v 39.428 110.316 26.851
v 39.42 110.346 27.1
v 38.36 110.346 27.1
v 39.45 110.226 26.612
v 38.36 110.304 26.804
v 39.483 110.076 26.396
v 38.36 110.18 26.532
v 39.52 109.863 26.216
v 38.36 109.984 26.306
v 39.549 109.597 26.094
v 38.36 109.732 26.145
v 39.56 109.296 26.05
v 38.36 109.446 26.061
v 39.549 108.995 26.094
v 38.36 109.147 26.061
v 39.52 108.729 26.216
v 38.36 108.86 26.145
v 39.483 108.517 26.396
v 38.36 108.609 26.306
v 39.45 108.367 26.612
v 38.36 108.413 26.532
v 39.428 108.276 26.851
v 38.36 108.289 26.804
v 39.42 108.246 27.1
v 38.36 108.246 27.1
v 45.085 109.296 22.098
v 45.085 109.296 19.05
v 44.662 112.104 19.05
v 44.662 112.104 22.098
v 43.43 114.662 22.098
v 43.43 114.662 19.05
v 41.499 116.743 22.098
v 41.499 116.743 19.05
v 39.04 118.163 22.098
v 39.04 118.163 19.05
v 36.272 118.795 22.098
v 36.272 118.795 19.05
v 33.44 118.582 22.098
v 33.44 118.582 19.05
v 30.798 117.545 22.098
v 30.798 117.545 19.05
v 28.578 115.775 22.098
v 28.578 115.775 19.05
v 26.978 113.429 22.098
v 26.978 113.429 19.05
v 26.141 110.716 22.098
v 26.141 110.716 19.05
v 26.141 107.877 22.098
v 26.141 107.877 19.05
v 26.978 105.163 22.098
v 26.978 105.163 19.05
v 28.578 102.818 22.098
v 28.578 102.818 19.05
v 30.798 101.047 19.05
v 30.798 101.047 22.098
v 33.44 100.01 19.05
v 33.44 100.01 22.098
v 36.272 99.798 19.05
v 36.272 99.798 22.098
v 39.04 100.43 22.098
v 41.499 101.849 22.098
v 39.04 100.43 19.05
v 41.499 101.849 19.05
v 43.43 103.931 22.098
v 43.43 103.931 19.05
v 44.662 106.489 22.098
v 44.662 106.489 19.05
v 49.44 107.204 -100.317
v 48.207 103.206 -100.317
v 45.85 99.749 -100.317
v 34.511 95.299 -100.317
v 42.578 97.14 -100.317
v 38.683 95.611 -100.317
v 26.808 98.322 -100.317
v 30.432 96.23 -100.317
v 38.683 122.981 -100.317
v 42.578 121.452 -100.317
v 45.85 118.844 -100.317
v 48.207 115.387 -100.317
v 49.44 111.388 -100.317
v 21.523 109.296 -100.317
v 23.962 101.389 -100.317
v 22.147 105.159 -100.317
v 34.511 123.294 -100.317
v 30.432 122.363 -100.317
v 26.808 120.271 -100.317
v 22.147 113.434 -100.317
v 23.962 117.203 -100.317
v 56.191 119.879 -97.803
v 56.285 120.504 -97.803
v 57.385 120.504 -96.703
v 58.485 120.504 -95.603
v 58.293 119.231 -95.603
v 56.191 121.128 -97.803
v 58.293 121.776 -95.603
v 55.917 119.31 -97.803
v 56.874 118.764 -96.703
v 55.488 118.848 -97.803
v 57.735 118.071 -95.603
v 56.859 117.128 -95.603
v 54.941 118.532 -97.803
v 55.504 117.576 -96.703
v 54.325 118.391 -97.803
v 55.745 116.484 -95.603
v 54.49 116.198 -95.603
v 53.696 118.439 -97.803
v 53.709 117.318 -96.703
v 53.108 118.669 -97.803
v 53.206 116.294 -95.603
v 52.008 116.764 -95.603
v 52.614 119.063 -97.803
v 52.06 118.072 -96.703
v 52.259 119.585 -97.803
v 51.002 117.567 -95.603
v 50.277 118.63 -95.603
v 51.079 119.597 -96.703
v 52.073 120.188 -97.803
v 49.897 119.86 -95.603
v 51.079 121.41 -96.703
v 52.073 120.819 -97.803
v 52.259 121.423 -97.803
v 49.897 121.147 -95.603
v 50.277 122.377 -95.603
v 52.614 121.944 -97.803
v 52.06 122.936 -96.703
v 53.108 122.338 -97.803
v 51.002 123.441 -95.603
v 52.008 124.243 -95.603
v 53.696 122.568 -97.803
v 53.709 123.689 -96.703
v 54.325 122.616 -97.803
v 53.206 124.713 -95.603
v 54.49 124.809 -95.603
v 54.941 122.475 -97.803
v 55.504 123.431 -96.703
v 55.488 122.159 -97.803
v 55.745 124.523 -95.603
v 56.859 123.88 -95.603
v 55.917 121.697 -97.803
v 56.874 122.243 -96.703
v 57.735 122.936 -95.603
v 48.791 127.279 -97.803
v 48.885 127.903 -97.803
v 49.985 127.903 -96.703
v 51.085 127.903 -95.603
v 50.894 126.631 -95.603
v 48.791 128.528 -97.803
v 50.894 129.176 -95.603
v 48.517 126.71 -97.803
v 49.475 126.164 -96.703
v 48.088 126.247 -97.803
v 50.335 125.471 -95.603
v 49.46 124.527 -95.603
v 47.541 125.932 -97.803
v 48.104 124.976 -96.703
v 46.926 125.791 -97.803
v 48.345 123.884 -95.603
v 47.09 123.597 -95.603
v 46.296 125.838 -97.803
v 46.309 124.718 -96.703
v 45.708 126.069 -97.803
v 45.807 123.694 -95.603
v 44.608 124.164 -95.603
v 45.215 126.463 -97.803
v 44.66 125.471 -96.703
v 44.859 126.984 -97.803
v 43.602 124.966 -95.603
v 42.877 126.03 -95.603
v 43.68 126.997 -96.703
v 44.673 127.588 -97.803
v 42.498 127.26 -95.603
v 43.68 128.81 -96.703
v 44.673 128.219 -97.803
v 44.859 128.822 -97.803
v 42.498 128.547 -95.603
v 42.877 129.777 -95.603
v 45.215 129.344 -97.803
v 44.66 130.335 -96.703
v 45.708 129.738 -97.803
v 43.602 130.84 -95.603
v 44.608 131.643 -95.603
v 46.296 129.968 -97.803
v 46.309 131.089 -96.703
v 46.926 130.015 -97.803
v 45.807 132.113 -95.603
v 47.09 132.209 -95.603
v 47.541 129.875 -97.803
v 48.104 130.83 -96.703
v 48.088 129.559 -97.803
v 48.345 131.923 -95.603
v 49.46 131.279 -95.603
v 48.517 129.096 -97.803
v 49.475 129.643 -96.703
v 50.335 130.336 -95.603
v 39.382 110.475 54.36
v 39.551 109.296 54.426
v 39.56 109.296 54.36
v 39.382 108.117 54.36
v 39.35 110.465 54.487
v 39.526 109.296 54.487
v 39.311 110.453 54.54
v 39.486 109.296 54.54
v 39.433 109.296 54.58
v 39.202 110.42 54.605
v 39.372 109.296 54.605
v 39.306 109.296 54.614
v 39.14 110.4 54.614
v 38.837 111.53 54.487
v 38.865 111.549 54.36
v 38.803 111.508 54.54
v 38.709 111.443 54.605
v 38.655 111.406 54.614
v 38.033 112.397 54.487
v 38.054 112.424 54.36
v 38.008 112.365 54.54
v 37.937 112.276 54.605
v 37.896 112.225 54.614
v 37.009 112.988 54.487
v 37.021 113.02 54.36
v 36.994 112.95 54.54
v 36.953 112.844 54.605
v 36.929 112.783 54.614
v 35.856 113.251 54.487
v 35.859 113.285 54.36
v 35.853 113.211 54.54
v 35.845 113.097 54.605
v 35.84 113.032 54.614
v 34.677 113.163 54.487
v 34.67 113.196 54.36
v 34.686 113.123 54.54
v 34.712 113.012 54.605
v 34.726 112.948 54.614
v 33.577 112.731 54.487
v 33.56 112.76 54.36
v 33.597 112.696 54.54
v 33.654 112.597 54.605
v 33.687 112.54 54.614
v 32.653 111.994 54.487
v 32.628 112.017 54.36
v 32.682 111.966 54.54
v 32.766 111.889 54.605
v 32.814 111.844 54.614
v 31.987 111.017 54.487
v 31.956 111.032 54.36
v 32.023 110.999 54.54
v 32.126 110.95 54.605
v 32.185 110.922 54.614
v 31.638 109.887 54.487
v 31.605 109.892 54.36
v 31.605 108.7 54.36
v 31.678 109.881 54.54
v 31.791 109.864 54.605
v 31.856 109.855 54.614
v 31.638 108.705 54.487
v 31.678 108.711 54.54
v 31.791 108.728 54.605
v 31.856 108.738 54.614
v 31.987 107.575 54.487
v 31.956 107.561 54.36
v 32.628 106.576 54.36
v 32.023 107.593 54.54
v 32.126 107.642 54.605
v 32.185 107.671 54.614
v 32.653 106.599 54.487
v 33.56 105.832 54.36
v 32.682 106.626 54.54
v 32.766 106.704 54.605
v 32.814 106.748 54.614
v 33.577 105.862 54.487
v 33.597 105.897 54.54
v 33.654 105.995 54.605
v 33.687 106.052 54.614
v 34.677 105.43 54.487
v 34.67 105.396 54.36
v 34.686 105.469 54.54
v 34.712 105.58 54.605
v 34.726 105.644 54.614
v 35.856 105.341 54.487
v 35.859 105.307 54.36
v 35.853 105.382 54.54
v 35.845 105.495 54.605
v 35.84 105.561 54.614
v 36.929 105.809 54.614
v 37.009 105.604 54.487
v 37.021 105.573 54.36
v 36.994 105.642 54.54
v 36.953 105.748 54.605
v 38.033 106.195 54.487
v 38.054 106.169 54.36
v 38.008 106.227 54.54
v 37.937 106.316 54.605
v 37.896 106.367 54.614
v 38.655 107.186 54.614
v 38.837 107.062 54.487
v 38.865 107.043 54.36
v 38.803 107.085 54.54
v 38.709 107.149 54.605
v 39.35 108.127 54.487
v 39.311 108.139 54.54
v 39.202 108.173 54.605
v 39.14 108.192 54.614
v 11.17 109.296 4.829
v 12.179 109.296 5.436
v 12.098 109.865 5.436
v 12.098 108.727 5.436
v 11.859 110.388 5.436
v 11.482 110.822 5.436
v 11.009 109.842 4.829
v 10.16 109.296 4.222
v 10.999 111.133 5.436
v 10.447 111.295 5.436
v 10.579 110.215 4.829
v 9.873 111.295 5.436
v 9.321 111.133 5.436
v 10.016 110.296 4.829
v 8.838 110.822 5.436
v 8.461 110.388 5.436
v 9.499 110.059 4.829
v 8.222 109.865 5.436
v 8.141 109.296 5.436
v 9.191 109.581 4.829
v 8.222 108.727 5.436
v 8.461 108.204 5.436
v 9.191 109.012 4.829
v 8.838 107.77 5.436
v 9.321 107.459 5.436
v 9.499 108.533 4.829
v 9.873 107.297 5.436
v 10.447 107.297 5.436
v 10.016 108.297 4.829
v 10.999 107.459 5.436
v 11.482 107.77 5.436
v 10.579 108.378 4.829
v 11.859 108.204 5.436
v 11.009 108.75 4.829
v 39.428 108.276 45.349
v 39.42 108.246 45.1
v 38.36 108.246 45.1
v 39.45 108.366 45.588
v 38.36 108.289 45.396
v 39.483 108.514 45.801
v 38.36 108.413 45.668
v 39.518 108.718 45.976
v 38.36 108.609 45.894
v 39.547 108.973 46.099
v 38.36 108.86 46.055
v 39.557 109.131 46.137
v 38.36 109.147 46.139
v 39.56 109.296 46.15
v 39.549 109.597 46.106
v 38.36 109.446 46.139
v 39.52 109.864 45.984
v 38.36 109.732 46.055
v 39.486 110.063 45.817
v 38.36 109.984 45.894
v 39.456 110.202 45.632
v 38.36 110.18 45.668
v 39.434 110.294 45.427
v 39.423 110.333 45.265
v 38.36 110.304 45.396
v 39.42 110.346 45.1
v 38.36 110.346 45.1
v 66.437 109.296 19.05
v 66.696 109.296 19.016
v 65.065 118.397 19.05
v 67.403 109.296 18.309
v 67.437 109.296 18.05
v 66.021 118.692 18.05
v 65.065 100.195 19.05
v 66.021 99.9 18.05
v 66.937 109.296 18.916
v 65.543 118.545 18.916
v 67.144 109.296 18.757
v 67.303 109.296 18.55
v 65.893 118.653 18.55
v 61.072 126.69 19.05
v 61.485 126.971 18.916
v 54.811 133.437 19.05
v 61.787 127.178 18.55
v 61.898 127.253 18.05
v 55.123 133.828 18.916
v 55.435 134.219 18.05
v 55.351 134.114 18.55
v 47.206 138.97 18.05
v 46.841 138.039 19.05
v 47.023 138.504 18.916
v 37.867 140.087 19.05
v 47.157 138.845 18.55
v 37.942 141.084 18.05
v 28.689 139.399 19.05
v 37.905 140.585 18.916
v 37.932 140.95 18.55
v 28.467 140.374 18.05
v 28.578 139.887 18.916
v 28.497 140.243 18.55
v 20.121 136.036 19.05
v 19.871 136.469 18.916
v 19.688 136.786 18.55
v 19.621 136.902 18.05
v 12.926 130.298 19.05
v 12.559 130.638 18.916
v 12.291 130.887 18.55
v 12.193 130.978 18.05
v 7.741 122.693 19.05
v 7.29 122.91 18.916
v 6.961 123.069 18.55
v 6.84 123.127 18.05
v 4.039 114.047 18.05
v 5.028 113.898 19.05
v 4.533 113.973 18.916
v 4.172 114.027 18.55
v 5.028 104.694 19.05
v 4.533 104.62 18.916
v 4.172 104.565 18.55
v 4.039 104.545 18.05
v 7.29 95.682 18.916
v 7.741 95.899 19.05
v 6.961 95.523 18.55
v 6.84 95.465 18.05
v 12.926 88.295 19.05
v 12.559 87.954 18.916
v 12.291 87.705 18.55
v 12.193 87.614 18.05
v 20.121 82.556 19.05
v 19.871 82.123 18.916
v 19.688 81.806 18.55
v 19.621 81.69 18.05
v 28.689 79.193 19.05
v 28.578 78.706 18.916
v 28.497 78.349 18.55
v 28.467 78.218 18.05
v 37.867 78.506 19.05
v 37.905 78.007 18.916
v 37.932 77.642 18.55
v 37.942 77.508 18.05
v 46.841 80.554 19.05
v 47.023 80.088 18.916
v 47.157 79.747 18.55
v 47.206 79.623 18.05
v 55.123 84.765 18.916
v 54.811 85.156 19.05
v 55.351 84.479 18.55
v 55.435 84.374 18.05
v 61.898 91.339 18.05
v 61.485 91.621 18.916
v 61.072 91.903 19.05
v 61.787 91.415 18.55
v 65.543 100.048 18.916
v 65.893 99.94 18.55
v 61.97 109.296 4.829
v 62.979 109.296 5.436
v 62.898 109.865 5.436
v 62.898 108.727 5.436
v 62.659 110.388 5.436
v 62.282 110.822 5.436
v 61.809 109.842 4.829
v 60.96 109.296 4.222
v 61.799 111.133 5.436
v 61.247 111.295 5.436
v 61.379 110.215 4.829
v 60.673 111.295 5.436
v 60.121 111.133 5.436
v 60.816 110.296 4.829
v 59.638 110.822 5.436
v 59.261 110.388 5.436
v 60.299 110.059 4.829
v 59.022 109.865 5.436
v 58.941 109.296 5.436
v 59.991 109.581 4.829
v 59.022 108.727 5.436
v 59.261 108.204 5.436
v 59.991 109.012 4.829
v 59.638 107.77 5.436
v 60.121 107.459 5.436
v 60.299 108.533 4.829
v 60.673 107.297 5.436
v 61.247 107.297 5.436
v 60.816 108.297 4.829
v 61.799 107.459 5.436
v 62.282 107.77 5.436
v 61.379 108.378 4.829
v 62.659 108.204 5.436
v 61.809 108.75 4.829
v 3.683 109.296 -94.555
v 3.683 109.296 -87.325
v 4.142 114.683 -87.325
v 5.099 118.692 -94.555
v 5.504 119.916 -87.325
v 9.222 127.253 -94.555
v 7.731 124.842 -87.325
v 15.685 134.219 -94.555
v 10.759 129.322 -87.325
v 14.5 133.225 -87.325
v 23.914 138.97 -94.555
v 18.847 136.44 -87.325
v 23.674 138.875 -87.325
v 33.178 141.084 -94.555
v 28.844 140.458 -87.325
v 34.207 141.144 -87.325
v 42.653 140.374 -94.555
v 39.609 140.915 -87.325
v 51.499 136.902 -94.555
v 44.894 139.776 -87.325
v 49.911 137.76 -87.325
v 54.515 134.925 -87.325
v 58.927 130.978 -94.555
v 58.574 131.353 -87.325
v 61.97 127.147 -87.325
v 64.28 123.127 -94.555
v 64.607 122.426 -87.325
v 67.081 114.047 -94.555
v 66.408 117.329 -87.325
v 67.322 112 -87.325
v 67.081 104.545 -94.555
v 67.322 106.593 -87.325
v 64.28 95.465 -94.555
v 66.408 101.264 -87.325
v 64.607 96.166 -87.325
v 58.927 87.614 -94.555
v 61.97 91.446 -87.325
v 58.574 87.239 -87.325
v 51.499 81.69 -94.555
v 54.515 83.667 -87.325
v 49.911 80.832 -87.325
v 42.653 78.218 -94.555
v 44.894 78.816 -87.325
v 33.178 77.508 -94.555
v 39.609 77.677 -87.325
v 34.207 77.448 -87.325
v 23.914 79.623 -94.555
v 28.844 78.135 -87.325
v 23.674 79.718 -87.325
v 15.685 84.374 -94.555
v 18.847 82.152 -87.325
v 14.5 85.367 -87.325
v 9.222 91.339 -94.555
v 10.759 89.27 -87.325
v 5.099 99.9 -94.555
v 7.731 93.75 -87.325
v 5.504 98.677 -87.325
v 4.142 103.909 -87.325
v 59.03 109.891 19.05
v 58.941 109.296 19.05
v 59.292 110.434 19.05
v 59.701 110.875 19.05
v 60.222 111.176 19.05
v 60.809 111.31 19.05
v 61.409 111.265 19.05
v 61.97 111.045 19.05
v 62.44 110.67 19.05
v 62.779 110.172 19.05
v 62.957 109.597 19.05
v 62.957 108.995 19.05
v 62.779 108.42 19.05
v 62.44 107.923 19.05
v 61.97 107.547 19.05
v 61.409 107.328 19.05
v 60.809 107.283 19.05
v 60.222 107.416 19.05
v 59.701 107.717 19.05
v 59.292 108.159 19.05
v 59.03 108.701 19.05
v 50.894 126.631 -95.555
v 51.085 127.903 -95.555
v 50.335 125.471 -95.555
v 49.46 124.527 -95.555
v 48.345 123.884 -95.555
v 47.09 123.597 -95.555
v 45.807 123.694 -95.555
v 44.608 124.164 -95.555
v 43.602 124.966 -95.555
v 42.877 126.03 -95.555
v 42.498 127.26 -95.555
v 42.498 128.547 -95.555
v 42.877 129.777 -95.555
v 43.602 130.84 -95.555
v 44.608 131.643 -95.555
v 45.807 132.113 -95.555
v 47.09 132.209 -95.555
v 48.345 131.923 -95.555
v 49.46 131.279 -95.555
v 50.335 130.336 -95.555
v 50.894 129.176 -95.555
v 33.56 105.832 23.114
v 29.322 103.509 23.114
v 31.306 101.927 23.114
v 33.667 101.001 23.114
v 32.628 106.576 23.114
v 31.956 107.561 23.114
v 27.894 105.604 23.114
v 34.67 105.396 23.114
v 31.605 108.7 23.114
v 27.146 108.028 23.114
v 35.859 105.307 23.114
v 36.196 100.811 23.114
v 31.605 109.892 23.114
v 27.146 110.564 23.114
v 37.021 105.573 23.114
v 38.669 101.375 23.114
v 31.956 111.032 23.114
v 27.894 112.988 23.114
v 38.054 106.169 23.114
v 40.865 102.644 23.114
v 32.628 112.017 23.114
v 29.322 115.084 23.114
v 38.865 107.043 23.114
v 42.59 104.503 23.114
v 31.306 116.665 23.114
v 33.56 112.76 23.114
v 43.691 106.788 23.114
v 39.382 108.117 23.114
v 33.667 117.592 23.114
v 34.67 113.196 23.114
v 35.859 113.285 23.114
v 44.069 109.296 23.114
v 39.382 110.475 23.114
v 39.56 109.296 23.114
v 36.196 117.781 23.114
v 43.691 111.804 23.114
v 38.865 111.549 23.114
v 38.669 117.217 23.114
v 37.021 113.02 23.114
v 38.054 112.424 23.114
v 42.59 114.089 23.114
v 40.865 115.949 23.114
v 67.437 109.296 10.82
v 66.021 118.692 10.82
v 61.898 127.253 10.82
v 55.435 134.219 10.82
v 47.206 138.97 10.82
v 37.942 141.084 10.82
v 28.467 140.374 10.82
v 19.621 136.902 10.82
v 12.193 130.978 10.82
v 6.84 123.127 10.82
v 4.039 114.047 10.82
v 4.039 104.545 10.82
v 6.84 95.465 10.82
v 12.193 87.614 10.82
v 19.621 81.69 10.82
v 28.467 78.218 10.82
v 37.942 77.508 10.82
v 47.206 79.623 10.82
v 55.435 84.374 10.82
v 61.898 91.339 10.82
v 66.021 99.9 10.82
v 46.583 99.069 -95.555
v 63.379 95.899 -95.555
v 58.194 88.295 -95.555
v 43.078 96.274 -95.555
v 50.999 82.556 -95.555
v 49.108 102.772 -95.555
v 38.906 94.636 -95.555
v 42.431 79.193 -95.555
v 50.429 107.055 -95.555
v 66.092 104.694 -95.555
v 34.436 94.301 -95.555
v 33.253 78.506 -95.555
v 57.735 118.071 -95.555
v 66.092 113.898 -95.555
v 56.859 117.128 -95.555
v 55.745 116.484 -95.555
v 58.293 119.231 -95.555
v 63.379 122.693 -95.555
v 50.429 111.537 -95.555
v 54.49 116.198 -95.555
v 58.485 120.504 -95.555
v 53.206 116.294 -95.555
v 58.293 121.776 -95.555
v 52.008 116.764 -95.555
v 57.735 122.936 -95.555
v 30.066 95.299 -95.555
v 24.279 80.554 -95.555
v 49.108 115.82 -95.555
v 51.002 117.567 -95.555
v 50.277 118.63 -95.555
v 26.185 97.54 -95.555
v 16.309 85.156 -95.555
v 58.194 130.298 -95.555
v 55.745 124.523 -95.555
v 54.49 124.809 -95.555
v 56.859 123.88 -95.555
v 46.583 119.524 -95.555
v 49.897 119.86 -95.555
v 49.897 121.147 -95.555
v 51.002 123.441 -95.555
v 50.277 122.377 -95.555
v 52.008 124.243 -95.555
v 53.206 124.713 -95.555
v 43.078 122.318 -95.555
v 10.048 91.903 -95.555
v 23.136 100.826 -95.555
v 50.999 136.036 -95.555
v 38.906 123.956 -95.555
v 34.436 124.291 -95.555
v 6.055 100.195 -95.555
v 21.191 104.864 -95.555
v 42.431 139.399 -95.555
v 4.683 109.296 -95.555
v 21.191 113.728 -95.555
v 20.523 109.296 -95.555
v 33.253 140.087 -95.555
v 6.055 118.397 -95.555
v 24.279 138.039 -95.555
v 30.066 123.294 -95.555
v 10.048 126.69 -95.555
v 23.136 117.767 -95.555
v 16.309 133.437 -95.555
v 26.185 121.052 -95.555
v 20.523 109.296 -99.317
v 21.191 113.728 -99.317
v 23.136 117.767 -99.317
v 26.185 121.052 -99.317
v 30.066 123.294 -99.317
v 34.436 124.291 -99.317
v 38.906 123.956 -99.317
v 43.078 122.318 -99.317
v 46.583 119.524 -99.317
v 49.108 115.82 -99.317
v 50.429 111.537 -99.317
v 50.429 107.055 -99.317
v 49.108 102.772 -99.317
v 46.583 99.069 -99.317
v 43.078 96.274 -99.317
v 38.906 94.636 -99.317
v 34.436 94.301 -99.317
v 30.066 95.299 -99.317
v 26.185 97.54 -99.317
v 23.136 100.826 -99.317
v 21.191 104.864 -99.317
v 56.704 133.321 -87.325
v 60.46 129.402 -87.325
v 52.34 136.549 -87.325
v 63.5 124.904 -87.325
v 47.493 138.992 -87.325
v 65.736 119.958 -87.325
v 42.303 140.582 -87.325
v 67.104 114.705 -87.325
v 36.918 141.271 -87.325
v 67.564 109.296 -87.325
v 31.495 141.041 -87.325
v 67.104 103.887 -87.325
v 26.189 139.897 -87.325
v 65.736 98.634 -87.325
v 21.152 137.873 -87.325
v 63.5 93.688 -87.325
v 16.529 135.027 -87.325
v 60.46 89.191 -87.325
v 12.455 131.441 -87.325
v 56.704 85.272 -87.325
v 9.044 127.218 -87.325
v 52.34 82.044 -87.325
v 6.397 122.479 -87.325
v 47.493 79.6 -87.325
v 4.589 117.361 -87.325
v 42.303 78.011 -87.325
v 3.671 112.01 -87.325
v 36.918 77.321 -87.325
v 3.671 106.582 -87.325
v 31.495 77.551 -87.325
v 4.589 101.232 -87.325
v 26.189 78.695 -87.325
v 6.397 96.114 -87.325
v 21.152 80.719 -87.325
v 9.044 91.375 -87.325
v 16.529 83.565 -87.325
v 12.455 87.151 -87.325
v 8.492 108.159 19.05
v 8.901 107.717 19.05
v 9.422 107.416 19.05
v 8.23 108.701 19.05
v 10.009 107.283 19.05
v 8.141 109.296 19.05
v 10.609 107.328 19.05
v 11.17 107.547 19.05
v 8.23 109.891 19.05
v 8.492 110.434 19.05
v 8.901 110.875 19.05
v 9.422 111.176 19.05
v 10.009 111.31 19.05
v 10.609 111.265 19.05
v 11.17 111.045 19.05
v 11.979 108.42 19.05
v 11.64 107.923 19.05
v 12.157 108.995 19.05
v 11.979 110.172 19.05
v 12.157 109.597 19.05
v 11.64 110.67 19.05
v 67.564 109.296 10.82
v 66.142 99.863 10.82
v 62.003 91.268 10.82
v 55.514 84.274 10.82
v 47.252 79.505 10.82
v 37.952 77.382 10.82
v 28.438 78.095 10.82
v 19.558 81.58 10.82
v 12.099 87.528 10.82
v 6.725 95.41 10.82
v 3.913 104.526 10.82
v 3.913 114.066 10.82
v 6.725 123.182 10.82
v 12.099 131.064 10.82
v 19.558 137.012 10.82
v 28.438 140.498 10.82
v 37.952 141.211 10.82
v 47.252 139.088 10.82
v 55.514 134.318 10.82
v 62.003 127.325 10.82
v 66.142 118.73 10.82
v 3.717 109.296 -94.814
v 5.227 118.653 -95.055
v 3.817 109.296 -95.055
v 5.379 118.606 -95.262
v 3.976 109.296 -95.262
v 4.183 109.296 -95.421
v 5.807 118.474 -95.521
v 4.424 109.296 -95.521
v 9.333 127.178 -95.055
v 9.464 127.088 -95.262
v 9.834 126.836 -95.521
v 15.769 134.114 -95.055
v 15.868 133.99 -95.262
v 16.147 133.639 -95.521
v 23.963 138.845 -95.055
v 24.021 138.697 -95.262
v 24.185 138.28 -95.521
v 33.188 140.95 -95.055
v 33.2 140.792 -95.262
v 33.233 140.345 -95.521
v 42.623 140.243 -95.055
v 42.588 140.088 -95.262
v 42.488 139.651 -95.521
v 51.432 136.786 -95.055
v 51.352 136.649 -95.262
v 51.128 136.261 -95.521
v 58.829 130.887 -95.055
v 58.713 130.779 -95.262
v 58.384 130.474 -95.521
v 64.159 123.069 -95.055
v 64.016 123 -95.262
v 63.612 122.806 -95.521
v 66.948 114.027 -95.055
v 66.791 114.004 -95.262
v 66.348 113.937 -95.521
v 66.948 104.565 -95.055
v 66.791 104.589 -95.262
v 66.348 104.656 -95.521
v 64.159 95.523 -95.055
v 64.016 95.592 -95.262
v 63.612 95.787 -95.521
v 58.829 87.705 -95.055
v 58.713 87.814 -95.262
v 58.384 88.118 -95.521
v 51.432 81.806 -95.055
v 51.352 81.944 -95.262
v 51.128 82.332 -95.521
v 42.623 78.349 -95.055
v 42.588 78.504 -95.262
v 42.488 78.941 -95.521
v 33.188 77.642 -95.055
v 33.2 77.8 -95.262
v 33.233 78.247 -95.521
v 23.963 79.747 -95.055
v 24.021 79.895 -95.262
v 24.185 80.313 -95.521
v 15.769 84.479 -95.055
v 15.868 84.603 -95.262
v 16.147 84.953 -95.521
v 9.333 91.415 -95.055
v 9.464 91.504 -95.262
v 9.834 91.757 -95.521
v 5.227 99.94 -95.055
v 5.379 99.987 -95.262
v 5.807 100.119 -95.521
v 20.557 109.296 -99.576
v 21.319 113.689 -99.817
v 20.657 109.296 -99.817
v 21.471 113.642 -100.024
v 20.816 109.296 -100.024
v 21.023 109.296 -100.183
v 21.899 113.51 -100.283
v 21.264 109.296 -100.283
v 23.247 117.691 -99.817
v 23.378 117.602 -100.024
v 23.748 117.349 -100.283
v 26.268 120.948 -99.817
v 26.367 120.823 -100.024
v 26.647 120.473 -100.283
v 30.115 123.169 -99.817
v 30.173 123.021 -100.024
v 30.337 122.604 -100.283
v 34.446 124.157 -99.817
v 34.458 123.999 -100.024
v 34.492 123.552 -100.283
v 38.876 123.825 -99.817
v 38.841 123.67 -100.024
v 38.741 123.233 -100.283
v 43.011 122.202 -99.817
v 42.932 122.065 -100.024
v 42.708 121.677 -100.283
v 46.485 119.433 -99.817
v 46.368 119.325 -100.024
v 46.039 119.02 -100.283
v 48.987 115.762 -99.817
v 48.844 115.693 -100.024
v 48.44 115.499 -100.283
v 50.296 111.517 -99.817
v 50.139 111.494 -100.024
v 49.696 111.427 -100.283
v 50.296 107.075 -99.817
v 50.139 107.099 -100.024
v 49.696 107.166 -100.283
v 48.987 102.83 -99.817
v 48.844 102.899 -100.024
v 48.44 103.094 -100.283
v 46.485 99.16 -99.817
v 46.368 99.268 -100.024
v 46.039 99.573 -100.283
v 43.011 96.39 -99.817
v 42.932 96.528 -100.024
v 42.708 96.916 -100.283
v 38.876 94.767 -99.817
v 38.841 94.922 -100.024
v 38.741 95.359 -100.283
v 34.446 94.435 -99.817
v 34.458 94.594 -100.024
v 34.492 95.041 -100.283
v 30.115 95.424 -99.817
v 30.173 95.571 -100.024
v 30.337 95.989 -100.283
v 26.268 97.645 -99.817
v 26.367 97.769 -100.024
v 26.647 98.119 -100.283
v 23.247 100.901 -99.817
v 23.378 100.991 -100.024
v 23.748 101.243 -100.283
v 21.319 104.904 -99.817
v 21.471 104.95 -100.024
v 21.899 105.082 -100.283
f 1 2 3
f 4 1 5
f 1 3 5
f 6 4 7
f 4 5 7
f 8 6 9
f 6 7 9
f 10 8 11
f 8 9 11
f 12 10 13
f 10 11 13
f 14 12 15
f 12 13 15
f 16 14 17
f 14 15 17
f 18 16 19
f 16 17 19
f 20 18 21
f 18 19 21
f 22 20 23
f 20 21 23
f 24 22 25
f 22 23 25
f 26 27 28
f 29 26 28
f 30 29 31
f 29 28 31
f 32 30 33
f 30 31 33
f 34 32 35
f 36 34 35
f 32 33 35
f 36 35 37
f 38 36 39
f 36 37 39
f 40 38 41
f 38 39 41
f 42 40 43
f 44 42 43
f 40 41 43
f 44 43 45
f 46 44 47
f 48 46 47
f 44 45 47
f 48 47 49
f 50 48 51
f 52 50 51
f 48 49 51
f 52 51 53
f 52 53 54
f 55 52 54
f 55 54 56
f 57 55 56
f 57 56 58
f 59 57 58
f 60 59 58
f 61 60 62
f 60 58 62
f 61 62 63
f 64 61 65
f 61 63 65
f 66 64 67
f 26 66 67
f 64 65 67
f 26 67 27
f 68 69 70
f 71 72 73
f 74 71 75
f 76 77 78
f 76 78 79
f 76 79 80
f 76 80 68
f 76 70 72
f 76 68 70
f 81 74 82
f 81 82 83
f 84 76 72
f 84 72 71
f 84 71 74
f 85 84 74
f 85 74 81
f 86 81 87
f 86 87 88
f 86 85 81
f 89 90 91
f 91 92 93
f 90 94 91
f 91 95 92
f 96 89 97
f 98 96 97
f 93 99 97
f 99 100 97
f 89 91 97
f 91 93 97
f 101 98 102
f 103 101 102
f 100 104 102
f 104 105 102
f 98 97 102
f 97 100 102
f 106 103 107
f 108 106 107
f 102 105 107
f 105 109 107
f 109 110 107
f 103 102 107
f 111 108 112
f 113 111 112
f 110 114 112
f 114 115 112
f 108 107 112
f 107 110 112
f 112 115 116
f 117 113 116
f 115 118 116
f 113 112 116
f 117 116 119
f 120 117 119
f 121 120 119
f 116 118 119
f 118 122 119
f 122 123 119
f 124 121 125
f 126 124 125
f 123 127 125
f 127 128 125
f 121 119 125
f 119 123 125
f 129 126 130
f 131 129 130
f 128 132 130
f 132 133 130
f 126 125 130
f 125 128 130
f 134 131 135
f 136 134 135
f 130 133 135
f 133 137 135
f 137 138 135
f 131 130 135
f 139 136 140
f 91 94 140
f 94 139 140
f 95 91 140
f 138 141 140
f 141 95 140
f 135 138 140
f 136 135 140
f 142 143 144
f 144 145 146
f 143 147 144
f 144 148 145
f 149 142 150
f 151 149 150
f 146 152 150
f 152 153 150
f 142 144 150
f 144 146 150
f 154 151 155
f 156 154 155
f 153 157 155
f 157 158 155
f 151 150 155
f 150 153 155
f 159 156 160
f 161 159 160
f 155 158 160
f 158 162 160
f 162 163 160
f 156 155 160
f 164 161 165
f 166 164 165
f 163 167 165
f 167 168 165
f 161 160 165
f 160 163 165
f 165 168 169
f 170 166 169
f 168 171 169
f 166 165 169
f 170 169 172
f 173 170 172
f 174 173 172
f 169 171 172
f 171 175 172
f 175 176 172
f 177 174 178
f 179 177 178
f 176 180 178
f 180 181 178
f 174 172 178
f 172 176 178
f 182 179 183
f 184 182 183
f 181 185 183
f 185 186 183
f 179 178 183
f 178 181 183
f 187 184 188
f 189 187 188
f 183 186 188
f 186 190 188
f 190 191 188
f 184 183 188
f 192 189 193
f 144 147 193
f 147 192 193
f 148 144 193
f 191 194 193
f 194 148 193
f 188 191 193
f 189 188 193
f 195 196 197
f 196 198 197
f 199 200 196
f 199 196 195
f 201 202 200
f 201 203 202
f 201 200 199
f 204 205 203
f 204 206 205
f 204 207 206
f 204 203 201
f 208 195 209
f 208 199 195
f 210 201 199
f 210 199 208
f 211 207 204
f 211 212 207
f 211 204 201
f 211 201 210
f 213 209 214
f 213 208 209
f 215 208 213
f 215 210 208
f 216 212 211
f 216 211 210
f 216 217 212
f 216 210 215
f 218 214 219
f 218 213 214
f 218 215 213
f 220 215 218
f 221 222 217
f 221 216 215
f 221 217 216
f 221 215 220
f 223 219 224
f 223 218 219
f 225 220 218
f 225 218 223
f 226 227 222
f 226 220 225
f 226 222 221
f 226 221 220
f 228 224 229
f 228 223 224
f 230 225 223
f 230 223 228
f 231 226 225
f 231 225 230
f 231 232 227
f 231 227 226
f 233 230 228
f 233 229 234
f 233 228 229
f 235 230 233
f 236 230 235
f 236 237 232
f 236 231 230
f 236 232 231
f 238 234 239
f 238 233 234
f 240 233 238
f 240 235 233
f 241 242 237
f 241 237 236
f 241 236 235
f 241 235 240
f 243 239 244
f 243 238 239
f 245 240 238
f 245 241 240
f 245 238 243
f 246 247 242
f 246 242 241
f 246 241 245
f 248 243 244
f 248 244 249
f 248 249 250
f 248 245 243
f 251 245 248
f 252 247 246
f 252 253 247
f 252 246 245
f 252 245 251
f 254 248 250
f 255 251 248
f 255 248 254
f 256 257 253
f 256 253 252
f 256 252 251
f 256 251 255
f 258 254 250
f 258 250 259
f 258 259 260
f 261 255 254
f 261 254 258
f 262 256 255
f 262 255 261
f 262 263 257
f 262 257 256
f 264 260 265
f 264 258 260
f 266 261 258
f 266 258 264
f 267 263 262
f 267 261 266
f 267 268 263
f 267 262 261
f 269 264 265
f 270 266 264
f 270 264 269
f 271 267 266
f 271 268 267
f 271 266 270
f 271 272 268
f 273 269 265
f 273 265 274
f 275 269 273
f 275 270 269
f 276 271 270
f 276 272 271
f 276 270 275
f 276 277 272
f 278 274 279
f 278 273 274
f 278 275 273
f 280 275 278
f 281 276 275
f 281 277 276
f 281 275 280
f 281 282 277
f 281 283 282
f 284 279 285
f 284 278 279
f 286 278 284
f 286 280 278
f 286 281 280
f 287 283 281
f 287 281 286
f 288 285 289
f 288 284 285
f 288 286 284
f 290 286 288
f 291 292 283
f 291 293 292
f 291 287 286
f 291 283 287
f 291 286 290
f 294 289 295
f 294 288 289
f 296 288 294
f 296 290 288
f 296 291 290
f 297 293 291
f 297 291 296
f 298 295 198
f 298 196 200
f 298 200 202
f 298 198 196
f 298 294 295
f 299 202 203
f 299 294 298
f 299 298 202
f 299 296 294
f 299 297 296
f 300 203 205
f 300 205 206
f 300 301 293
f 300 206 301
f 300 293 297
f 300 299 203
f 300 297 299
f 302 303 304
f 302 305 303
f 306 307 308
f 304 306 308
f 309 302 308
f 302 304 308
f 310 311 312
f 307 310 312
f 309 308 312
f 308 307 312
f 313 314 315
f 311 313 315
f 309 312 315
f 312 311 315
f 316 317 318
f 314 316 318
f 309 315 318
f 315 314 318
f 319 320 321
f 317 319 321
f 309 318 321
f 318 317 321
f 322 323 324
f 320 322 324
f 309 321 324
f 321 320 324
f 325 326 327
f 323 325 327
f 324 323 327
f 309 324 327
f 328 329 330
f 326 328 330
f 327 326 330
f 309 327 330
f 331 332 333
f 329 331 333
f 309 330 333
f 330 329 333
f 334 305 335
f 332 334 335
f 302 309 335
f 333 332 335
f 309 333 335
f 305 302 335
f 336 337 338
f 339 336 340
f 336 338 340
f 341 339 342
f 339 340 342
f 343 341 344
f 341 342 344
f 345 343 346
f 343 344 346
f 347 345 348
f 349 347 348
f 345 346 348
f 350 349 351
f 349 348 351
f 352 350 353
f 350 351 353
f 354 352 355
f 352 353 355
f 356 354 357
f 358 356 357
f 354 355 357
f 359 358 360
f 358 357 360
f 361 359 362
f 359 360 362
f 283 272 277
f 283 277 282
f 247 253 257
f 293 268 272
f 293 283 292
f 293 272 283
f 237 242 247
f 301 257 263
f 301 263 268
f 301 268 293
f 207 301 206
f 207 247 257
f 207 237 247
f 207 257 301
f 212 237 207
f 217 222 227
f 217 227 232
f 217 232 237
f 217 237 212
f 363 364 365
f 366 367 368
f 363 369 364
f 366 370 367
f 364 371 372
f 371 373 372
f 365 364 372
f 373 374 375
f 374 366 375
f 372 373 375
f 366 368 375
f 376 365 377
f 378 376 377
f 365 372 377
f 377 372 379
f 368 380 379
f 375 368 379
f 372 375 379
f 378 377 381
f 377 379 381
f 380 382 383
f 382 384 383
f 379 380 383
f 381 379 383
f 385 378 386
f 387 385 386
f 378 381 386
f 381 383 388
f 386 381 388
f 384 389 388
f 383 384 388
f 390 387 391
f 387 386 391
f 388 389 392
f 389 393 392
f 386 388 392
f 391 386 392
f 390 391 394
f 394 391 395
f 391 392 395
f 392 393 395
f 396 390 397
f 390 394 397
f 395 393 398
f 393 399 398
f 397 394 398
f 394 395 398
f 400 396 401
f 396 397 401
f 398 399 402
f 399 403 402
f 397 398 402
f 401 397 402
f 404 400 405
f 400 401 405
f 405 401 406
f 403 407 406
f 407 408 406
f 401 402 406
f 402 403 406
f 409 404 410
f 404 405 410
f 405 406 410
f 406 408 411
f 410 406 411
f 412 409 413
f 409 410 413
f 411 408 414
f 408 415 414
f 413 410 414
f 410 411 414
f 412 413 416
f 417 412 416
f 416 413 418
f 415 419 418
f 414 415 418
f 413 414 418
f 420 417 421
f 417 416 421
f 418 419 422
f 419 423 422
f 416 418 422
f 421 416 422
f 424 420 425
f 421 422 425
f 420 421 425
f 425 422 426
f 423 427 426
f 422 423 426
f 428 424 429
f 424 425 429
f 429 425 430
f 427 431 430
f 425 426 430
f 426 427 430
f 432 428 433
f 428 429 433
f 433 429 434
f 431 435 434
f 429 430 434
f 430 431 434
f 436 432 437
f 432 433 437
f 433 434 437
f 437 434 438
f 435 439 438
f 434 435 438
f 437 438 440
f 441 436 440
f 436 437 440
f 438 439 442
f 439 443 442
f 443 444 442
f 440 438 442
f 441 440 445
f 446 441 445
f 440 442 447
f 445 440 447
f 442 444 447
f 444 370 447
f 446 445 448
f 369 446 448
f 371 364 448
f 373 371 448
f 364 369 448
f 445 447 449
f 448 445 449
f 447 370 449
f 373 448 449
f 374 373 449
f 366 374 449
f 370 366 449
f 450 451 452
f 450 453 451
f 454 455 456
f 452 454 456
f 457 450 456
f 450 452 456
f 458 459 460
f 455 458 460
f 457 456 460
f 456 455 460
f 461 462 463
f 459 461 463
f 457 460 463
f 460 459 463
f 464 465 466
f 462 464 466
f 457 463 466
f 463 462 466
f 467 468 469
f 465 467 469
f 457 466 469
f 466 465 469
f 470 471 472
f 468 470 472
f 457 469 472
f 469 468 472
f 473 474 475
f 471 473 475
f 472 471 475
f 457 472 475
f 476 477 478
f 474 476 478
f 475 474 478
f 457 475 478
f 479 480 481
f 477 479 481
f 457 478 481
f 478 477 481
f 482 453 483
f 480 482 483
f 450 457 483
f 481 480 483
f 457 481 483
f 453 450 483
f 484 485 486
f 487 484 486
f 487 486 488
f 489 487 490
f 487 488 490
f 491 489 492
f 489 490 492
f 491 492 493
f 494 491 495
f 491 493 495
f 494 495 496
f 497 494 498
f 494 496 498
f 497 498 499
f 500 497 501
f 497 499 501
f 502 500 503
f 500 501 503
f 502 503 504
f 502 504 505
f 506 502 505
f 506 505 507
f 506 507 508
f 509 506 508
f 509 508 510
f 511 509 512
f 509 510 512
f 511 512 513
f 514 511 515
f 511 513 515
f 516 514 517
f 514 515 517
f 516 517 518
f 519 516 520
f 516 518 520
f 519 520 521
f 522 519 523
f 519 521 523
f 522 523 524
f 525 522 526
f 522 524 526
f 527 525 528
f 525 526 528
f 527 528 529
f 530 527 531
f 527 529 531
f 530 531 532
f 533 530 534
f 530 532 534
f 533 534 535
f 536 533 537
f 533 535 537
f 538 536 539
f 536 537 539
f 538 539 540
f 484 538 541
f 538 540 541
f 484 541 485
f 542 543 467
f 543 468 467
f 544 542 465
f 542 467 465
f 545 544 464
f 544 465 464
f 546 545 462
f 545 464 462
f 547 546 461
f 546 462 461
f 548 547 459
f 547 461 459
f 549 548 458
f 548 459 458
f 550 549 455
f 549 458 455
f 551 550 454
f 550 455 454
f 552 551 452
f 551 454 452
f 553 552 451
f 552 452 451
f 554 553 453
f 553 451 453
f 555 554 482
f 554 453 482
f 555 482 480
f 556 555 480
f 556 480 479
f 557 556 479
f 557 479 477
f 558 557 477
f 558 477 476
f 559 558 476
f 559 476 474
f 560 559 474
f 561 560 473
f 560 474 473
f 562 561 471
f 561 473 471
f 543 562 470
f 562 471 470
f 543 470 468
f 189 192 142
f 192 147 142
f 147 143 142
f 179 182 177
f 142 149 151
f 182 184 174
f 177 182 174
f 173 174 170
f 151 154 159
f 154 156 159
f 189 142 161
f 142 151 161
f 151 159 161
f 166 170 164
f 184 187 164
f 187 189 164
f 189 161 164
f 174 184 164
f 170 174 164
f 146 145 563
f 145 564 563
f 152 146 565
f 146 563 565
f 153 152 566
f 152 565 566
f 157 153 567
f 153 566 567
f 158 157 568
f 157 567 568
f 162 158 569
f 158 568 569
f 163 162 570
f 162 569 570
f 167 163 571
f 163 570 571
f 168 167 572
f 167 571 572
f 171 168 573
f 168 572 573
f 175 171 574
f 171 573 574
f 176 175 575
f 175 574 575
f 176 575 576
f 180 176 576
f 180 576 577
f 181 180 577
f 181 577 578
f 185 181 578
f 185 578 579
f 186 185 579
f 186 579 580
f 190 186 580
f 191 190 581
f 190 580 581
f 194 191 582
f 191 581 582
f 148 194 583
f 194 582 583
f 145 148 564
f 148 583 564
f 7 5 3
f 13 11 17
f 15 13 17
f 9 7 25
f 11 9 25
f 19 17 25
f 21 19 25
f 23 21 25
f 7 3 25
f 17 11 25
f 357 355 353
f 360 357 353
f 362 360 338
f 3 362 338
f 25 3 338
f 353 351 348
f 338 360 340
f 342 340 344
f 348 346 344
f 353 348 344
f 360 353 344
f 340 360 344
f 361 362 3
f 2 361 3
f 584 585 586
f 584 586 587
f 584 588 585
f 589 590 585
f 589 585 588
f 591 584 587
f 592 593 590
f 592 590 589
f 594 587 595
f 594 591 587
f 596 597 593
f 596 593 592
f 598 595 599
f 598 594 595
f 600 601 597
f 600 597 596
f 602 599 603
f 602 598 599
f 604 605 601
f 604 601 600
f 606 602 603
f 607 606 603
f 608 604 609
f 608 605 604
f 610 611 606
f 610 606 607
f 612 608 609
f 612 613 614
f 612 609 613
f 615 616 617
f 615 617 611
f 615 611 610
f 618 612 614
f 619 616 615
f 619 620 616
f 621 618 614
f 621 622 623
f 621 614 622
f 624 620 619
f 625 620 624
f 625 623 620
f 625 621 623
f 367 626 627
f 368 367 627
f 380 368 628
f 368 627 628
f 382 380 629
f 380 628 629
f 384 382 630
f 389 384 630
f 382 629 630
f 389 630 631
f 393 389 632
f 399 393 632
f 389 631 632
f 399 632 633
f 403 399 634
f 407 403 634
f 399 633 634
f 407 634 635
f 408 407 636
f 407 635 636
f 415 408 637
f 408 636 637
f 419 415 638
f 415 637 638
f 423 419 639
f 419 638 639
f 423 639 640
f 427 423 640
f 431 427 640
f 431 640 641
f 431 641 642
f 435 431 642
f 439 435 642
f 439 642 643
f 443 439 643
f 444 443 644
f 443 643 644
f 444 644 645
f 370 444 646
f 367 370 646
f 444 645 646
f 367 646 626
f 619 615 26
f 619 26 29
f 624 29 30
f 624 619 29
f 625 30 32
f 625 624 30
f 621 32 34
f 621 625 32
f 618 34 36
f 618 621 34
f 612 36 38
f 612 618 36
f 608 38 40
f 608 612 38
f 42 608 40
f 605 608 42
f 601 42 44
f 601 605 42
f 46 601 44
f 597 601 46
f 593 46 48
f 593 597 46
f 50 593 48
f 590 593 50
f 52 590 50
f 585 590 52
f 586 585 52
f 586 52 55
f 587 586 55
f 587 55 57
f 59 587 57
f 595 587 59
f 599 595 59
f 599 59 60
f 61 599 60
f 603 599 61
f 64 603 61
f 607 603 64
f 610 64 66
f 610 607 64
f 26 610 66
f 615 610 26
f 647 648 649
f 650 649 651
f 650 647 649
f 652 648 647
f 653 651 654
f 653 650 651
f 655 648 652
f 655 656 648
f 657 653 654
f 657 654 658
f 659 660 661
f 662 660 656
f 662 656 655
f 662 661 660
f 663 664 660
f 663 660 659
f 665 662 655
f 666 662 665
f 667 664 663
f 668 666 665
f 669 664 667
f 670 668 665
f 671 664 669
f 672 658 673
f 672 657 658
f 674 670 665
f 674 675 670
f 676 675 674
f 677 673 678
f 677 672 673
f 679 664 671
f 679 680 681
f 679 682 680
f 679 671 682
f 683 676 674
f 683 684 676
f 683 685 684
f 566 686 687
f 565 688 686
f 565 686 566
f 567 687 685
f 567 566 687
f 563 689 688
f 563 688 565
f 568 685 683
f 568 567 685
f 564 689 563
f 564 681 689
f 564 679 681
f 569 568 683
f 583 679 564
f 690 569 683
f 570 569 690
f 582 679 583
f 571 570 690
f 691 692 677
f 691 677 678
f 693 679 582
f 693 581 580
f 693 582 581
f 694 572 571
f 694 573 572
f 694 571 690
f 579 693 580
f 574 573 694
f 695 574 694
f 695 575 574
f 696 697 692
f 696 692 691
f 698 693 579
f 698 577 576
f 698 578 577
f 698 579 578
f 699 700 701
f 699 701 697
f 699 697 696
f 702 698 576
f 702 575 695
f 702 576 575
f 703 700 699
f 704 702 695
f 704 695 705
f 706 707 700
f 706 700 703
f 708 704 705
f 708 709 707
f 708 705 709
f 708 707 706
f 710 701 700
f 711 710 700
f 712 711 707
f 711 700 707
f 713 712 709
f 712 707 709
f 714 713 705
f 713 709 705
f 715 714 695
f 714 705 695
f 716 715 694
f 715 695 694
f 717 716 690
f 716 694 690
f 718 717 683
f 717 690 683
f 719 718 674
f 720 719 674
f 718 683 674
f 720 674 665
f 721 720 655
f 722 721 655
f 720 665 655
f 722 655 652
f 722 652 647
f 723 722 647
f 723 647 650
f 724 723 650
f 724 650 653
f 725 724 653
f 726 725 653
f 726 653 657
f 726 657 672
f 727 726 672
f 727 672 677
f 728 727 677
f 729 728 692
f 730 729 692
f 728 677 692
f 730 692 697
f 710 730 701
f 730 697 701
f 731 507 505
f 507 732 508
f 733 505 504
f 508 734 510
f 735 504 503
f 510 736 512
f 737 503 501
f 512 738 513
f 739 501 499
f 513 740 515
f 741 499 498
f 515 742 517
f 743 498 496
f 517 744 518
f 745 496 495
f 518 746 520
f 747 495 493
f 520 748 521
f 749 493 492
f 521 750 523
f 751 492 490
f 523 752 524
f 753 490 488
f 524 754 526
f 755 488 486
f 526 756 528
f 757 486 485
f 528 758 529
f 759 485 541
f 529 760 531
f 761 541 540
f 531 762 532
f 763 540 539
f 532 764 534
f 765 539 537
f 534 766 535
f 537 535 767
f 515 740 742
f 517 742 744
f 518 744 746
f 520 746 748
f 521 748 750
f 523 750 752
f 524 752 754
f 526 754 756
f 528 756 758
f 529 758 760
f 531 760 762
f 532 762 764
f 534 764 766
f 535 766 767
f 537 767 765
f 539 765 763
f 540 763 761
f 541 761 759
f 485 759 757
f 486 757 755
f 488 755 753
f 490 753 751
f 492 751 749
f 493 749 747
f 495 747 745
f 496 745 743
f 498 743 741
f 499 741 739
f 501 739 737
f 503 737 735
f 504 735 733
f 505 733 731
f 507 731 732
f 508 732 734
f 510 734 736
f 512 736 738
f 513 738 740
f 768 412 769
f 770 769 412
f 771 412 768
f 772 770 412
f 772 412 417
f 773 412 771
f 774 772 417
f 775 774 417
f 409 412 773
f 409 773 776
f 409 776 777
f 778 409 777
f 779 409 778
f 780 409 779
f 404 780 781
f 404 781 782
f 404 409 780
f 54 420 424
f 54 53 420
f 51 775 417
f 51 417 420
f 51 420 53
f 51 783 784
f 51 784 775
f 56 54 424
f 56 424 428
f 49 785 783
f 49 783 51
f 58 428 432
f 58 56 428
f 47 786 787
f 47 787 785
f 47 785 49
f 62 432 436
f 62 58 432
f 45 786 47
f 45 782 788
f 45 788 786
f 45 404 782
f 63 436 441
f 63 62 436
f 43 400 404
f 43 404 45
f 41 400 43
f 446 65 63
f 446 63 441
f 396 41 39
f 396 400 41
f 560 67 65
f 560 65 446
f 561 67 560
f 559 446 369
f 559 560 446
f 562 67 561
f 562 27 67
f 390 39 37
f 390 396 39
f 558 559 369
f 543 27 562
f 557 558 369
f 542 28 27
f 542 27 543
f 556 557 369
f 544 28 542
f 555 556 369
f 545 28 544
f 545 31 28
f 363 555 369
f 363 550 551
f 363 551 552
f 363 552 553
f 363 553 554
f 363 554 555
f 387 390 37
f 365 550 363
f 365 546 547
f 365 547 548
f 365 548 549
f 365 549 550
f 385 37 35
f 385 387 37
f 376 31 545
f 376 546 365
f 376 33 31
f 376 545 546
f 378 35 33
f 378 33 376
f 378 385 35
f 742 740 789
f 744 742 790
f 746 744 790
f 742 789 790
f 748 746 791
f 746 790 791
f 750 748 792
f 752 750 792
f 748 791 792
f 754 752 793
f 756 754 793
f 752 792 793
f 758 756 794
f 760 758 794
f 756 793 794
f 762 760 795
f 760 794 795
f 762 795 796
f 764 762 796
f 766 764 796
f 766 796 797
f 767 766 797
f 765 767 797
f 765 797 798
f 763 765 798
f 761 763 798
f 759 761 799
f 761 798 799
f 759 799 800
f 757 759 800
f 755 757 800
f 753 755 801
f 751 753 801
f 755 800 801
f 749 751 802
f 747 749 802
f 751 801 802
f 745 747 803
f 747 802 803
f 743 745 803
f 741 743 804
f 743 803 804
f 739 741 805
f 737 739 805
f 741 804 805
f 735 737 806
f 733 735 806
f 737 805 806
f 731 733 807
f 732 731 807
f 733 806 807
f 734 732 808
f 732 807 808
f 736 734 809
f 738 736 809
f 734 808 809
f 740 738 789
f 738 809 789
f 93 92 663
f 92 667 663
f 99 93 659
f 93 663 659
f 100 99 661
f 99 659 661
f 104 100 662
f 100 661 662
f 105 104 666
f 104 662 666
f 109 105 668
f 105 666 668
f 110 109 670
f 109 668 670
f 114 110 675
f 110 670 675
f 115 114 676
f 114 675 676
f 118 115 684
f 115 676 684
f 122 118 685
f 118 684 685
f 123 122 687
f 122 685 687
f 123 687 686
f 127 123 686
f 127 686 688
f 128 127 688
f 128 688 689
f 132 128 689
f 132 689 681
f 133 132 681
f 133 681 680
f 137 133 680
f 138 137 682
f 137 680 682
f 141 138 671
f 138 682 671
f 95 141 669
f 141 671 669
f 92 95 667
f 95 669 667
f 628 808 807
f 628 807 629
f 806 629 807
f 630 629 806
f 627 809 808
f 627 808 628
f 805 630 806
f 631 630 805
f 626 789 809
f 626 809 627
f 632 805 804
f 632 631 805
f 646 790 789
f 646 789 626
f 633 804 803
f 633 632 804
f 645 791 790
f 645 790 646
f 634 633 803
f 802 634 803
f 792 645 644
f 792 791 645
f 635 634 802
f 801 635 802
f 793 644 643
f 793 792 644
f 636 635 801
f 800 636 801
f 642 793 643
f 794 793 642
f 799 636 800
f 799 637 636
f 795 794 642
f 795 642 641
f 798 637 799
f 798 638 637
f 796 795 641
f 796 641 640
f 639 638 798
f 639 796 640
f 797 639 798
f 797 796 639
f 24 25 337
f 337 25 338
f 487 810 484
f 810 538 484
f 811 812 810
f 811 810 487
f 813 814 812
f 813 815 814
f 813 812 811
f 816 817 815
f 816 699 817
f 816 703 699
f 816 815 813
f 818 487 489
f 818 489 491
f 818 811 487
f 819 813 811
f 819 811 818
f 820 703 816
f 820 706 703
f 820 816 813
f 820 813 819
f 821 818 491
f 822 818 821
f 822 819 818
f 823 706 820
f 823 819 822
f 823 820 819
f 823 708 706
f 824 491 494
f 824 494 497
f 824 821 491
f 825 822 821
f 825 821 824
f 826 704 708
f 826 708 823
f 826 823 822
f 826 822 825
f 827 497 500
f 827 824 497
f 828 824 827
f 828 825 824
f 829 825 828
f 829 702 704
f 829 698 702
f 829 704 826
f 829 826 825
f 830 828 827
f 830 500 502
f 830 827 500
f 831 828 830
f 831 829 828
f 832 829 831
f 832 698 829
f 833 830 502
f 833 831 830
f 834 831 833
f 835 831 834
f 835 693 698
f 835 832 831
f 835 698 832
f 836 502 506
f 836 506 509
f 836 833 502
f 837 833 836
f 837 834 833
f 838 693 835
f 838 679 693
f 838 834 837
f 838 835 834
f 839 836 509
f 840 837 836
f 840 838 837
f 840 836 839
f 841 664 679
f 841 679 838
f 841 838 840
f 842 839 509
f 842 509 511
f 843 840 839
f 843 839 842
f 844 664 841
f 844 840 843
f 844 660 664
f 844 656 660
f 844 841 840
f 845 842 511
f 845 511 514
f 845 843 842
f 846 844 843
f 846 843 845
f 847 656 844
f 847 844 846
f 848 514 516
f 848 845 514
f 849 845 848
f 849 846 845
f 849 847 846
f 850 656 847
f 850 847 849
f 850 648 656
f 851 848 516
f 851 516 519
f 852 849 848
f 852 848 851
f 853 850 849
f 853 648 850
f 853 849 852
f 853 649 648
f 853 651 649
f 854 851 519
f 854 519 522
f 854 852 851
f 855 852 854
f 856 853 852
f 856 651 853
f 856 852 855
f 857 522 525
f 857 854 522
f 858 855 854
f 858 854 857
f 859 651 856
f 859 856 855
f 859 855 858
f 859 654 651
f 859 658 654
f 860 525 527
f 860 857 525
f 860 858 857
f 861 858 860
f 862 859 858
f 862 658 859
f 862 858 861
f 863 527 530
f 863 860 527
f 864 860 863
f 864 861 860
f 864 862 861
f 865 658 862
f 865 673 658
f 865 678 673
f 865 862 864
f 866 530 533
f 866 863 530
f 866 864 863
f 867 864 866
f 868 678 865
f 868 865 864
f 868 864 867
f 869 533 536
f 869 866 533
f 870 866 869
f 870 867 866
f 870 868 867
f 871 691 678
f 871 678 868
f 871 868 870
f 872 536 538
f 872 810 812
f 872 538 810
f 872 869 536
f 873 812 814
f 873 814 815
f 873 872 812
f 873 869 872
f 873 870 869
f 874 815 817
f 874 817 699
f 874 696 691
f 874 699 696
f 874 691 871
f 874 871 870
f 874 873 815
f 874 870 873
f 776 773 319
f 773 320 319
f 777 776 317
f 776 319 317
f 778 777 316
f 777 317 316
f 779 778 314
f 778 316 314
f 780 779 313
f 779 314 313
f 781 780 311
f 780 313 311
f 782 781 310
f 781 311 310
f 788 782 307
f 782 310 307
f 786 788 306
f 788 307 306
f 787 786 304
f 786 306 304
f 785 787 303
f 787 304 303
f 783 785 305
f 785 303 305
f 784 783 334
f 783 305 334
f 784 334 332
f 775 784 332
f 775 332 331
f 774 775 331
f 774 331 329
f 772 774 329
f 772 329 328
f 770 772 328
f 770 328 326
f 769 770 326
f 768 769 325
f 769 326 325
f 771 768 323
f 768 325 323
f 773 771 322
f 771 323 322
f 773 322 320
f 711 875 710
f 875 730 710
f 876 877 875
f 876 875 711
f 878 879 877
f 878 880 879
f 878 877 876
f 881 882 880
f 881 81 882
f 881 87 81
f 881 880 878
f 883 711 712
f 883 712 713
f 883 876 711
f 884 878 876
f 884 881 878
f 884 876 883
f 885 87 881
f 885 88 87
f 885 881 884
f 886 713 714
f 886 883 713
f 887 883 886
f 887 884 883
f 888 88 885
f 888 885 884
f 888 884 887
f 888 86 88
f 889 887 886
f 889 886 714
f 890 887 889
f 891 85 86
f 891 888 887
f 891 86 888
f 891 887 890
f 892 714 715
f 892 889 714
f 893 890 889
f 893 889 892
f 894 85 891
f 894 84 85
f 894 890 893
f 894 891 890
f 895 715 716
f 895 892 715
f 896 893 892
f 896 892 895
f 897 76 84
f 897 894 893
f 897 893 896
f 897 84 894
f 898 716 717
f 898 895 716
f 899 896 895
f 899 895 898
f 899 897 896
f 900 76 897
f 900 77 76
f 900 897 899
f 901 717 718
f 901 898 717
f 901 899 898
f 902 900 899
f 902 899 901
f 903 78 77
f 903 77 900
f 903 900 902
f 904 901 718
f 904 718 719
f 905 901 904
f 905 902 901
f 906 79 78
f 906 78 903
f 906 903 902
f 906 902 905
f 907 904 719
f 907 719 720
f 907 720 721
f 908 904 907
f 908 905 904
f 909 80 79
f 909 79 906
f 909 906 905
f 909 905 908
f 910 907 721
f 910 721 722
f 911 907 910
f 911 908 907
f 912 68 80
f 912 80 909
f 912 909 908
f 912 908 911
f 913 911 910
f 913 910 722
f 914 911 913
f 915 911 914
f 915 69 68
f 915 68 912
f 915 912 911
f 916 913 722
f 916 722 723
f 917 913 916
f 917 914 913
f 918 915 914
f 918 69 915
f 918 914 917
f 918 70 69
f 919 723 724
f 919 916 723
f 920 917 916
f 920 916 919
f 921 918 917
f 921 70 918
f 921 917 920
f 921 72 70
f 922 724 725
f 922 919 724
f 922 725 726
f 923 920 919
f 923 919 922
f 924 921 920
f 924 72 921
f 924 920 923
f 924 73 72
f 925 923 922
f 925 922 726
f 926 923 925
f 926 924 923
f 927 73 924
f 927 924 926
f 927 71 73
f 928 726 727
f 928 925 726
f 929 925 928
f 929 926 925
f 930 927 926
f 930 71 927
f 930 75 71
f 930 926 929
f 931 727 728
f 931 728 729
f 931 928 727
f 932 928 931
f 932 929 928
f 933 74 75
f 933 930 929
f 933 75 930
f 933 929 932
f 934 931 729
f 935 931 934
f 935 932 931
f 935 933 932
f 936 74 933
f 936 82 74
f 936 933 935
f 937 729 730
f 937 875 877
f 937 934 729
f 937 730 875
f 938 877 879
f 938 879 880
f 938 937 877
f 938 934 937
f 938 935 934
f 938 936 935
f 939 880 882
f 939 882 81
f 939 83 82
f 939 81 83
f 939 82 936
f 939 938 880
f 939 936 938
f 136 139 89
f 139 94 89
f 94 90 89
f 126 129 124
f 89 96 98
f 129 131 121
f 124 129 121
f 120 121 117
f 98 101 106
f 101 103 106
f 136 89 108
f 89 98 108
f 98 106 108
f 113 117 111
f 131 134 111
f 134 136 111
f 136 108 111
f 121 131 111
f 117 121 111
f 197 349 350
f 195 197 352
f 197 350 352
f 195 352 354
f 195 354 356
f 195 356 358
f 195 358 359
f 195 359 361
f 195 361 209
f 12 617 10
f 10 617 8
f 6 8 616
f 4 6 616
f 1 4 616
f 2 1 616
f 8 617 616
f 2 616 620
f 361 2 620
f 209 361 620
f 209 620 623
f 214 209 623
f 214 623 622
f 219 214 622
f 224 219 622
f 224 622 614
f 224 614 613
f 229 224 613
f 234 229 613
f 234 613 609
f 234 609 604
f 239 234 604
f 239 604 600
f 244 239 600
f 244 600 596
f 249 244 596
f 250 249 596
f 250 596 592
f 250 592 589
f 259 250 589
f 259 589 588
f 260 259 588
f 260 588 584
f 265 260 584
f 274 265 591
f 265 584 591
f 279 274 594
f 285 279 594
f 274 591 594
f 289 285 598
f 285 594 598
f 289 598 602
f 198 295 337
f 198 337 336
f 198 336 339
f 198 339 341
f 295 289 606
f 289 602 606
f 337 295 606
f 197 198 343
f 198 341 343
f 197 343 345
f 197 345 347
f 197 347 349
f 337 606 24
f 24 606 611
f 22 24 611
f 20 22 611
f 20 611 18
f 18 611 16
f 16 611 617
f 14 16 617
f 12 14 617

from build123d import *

# Parameters (mm, degrees)
SKETCH1_W                       = 32.004
SKETCH1_H                       = 98.1456
SKETCH2_R                       = 31.877
BOSS_EXTRUDE1_DEPTH             = 8.2296
SKETCH3_R                       = 15.0368
BOSS_EXTRUDE2_DEPTH             = 4.7625
SKETCH4_R                       = 31.877
BOSS_EXTRUDE3_DEPTH             = 8.2296
SKETCH5_R                       = 9.525
BOSS_EXTRUDE4_DEPTH             = 4.064
SKETCH6_R                       = 4
BOSS_EXTRUDE5_DEPTH             = 31.5
CUT_EXTRUDE1_REACH              = 31.204
F_21_0_159_DIAMETER_HOLE1_D     = 4.0386
F_21_0_159_DIAMETER_HOLE1_DEPTH = 13.6144
F_21_0_159_DIAMETER_HOLE1_TIP   = 1.213317848
CHAMFER1_SIZE2                  = 1.016
CHAMFER1_SIZE                   = 1.015999998
FILLET1_R                       = 0.254
FILLET2_R                       = 1


with BuildPart() as part:
    # Sketch1 → Revolve1 (revolve)
    with BuildSketch(Plane.XZ.offset(-109.2962)):
        with Locations((51.562, -38.2524)):
            Rectangle(SKETCH1_W, SKETCH1_H)
    revolve(axis=Axis((35.56, 109.2962, 10.8204), (0, 0, -1)))

    # Sketch2 → Boss-Extrude1 (add)
    with BuildSketch(Plane(origin=(0, 0, -87.3252), x_dir=(-1, 0, 0), z_dir=(0, 0, -1))):
        with Locations((-35.56, 109.2962)):
            Circle(SKETCH2_R)
    extrude(amount=BOSS_EXTRUDE1_DEPTH)

    # Sketch3 → Boss-Extrude2 (add)
    with BuildSketch(Plane(origin=(0, 0, -95.5548), x_dir=(-1, 0, 0), z_dir=(0, 0, -1))):
        with Locations((-35.56, 109.2962)):
            Circle(SKETCH3_R)
    extrude(amount=BOSS_EXTRUDE2_DEPTH)

    # Sketch4 → Boss-Extrude3 (add)
    with BuildSketch(Plane.XY.offset(10.8204)):
        with Locations((35.56, 109.2962)):
            Circle(SKETCH4_R)
    extrude(amount=BOSS_EXTRUDE3_DEPTH)

    # Sketch5 → Boss-Extrude4 (add)
    with BuildSketch(Plane.XY.offset(19.05)):
        with Locations((35.56, 109.2962)):
            Circle(SKETCH5_R)
    extrude(amount=BOSS_EXTRUDE4_DEPTH)

    # Sketch6 → Boss-Extrude5 (add)
    with BuildSketch(Plane.XY.offset(23.114)):
        with Locations((35.56, 109.2962)):
            Circle(SKETCH6_R)
    extrude(amount=BOSS_EXTRUDE5_DEPTH)

    # Sketch7 → Cut-Extrude1 (cut, up to next)
    with BuildSketch(Plane(origin=(38.36, 0, 0), x_dir=(0, -1, 0), z_dir=(-1, 0, 0)), mode=Mode.PRIVATE) as cut_extrude1_sk1:
        with BuildLine():
            Line((-108.2462, 27.1), (-108.2462, 45.1))
            ThreePointArc((-108.2462, 45.1), (-109.2962, 46.15), (-110.3462, 45.1))
            Line((-110.3462, 45.1), (-110.3462, 27.1))
            ThreePointArc((-110.3462, 27.1), (-109.2962, 26.05), (-108.2462, 27.1))
        make_face()
    cut_extrude1_tool1 = extrude(cut_extrude1_sk1.sketch, amount=-CUT_EXTRUDE1_REACH, mode=Mode.PRIVATE) & part.part
    add(cut_extrude1_tool1.solids().sort_by_distance((38.36, 109.2962, 36.1))[0], mode=Mode.SUBTRACT)

    # Sketch8 → Revolve2 (revolve)
    with BuildSketch(Plane.XZ.offset(-120.503559639)):
        Polygon((58.485090683, -95.5548), (54.167090681, -95.5548), (54.167090681, -97.802699998), (56.285090681, -97.802699998), (58.485090683, -95.602699996), align=None)
    revolve(axis=Axis((54.167090681, 120.503559639, -95.5548), (0, 0, -1)))

    # Sketch9 → Revolve3 (revolve)
    with BuildSketch(Plane.XZ.offset(-127.903290683)):
        Polygon((51.085359639, -95.5548), (46.767359637, -95.5548), (46.767359637, -97.802699998), (48.885359637, -97.802699998), (51.085359639, -95.602699996), align=None)
    revolve(axis=Axis((46.767359637, 127.903290683, -95.5548), (0, 0, -1)))

    # #21 (0.159) Diameter Hole1
    with Locations(Plane.XY.offset(19.05)):
        with Locations((10.16, 109.2962), (60.96, 109.2962)):
            Hole(F_21_0_159_DIAMETER_HOLE1_D / 2, depth=F_21_0_159_DIAMETER_HOLE1_DEPTH)
            with Locations((0, 0, -(F_21_0_159_DIAMETER_HOLE1_DEPTH + F_21_0_159_DIAMETER_HOLE1_TIP / 2))):  # 118° drill point
                Cone(0, F_21_0_159_DIAMETER_HOLE1_D / 2, F_21_0_159_DIAMETER_HOLE1_TIP, mode=Mode.SUBTRACT)

    # Chamfer1
    chamfer1_edges = [part.edges().sort_by_distance(p)[0] for p in [
        (26.035, 109.2962, 23.114),
    ]]
    chamfer(chamfer1_edges, length=CHAMFER1_SIZE, length2=CHAMFER1_SIZE2)

    # Fillet1
    fillet1_edges = [part.edges().sort_by_distance(p)[0] for p in [
        (31.56, 109.2962, 54.614),
    ]]
    fillet(fillet1_edges, radius=FILLET1_R)

    # Fillet2
    fillet2_edges = [part.edges().sort_by_distance(p)[0] for p in [
        (50.5968, 109.2962, -100.3173),
        (3.683, 109.2962, 19.05),
        (67.437, 109.2962, -95.5548),
    ]]
    fillet(fillet2_edges, radius=FILLET2_R)


solid = part.part
